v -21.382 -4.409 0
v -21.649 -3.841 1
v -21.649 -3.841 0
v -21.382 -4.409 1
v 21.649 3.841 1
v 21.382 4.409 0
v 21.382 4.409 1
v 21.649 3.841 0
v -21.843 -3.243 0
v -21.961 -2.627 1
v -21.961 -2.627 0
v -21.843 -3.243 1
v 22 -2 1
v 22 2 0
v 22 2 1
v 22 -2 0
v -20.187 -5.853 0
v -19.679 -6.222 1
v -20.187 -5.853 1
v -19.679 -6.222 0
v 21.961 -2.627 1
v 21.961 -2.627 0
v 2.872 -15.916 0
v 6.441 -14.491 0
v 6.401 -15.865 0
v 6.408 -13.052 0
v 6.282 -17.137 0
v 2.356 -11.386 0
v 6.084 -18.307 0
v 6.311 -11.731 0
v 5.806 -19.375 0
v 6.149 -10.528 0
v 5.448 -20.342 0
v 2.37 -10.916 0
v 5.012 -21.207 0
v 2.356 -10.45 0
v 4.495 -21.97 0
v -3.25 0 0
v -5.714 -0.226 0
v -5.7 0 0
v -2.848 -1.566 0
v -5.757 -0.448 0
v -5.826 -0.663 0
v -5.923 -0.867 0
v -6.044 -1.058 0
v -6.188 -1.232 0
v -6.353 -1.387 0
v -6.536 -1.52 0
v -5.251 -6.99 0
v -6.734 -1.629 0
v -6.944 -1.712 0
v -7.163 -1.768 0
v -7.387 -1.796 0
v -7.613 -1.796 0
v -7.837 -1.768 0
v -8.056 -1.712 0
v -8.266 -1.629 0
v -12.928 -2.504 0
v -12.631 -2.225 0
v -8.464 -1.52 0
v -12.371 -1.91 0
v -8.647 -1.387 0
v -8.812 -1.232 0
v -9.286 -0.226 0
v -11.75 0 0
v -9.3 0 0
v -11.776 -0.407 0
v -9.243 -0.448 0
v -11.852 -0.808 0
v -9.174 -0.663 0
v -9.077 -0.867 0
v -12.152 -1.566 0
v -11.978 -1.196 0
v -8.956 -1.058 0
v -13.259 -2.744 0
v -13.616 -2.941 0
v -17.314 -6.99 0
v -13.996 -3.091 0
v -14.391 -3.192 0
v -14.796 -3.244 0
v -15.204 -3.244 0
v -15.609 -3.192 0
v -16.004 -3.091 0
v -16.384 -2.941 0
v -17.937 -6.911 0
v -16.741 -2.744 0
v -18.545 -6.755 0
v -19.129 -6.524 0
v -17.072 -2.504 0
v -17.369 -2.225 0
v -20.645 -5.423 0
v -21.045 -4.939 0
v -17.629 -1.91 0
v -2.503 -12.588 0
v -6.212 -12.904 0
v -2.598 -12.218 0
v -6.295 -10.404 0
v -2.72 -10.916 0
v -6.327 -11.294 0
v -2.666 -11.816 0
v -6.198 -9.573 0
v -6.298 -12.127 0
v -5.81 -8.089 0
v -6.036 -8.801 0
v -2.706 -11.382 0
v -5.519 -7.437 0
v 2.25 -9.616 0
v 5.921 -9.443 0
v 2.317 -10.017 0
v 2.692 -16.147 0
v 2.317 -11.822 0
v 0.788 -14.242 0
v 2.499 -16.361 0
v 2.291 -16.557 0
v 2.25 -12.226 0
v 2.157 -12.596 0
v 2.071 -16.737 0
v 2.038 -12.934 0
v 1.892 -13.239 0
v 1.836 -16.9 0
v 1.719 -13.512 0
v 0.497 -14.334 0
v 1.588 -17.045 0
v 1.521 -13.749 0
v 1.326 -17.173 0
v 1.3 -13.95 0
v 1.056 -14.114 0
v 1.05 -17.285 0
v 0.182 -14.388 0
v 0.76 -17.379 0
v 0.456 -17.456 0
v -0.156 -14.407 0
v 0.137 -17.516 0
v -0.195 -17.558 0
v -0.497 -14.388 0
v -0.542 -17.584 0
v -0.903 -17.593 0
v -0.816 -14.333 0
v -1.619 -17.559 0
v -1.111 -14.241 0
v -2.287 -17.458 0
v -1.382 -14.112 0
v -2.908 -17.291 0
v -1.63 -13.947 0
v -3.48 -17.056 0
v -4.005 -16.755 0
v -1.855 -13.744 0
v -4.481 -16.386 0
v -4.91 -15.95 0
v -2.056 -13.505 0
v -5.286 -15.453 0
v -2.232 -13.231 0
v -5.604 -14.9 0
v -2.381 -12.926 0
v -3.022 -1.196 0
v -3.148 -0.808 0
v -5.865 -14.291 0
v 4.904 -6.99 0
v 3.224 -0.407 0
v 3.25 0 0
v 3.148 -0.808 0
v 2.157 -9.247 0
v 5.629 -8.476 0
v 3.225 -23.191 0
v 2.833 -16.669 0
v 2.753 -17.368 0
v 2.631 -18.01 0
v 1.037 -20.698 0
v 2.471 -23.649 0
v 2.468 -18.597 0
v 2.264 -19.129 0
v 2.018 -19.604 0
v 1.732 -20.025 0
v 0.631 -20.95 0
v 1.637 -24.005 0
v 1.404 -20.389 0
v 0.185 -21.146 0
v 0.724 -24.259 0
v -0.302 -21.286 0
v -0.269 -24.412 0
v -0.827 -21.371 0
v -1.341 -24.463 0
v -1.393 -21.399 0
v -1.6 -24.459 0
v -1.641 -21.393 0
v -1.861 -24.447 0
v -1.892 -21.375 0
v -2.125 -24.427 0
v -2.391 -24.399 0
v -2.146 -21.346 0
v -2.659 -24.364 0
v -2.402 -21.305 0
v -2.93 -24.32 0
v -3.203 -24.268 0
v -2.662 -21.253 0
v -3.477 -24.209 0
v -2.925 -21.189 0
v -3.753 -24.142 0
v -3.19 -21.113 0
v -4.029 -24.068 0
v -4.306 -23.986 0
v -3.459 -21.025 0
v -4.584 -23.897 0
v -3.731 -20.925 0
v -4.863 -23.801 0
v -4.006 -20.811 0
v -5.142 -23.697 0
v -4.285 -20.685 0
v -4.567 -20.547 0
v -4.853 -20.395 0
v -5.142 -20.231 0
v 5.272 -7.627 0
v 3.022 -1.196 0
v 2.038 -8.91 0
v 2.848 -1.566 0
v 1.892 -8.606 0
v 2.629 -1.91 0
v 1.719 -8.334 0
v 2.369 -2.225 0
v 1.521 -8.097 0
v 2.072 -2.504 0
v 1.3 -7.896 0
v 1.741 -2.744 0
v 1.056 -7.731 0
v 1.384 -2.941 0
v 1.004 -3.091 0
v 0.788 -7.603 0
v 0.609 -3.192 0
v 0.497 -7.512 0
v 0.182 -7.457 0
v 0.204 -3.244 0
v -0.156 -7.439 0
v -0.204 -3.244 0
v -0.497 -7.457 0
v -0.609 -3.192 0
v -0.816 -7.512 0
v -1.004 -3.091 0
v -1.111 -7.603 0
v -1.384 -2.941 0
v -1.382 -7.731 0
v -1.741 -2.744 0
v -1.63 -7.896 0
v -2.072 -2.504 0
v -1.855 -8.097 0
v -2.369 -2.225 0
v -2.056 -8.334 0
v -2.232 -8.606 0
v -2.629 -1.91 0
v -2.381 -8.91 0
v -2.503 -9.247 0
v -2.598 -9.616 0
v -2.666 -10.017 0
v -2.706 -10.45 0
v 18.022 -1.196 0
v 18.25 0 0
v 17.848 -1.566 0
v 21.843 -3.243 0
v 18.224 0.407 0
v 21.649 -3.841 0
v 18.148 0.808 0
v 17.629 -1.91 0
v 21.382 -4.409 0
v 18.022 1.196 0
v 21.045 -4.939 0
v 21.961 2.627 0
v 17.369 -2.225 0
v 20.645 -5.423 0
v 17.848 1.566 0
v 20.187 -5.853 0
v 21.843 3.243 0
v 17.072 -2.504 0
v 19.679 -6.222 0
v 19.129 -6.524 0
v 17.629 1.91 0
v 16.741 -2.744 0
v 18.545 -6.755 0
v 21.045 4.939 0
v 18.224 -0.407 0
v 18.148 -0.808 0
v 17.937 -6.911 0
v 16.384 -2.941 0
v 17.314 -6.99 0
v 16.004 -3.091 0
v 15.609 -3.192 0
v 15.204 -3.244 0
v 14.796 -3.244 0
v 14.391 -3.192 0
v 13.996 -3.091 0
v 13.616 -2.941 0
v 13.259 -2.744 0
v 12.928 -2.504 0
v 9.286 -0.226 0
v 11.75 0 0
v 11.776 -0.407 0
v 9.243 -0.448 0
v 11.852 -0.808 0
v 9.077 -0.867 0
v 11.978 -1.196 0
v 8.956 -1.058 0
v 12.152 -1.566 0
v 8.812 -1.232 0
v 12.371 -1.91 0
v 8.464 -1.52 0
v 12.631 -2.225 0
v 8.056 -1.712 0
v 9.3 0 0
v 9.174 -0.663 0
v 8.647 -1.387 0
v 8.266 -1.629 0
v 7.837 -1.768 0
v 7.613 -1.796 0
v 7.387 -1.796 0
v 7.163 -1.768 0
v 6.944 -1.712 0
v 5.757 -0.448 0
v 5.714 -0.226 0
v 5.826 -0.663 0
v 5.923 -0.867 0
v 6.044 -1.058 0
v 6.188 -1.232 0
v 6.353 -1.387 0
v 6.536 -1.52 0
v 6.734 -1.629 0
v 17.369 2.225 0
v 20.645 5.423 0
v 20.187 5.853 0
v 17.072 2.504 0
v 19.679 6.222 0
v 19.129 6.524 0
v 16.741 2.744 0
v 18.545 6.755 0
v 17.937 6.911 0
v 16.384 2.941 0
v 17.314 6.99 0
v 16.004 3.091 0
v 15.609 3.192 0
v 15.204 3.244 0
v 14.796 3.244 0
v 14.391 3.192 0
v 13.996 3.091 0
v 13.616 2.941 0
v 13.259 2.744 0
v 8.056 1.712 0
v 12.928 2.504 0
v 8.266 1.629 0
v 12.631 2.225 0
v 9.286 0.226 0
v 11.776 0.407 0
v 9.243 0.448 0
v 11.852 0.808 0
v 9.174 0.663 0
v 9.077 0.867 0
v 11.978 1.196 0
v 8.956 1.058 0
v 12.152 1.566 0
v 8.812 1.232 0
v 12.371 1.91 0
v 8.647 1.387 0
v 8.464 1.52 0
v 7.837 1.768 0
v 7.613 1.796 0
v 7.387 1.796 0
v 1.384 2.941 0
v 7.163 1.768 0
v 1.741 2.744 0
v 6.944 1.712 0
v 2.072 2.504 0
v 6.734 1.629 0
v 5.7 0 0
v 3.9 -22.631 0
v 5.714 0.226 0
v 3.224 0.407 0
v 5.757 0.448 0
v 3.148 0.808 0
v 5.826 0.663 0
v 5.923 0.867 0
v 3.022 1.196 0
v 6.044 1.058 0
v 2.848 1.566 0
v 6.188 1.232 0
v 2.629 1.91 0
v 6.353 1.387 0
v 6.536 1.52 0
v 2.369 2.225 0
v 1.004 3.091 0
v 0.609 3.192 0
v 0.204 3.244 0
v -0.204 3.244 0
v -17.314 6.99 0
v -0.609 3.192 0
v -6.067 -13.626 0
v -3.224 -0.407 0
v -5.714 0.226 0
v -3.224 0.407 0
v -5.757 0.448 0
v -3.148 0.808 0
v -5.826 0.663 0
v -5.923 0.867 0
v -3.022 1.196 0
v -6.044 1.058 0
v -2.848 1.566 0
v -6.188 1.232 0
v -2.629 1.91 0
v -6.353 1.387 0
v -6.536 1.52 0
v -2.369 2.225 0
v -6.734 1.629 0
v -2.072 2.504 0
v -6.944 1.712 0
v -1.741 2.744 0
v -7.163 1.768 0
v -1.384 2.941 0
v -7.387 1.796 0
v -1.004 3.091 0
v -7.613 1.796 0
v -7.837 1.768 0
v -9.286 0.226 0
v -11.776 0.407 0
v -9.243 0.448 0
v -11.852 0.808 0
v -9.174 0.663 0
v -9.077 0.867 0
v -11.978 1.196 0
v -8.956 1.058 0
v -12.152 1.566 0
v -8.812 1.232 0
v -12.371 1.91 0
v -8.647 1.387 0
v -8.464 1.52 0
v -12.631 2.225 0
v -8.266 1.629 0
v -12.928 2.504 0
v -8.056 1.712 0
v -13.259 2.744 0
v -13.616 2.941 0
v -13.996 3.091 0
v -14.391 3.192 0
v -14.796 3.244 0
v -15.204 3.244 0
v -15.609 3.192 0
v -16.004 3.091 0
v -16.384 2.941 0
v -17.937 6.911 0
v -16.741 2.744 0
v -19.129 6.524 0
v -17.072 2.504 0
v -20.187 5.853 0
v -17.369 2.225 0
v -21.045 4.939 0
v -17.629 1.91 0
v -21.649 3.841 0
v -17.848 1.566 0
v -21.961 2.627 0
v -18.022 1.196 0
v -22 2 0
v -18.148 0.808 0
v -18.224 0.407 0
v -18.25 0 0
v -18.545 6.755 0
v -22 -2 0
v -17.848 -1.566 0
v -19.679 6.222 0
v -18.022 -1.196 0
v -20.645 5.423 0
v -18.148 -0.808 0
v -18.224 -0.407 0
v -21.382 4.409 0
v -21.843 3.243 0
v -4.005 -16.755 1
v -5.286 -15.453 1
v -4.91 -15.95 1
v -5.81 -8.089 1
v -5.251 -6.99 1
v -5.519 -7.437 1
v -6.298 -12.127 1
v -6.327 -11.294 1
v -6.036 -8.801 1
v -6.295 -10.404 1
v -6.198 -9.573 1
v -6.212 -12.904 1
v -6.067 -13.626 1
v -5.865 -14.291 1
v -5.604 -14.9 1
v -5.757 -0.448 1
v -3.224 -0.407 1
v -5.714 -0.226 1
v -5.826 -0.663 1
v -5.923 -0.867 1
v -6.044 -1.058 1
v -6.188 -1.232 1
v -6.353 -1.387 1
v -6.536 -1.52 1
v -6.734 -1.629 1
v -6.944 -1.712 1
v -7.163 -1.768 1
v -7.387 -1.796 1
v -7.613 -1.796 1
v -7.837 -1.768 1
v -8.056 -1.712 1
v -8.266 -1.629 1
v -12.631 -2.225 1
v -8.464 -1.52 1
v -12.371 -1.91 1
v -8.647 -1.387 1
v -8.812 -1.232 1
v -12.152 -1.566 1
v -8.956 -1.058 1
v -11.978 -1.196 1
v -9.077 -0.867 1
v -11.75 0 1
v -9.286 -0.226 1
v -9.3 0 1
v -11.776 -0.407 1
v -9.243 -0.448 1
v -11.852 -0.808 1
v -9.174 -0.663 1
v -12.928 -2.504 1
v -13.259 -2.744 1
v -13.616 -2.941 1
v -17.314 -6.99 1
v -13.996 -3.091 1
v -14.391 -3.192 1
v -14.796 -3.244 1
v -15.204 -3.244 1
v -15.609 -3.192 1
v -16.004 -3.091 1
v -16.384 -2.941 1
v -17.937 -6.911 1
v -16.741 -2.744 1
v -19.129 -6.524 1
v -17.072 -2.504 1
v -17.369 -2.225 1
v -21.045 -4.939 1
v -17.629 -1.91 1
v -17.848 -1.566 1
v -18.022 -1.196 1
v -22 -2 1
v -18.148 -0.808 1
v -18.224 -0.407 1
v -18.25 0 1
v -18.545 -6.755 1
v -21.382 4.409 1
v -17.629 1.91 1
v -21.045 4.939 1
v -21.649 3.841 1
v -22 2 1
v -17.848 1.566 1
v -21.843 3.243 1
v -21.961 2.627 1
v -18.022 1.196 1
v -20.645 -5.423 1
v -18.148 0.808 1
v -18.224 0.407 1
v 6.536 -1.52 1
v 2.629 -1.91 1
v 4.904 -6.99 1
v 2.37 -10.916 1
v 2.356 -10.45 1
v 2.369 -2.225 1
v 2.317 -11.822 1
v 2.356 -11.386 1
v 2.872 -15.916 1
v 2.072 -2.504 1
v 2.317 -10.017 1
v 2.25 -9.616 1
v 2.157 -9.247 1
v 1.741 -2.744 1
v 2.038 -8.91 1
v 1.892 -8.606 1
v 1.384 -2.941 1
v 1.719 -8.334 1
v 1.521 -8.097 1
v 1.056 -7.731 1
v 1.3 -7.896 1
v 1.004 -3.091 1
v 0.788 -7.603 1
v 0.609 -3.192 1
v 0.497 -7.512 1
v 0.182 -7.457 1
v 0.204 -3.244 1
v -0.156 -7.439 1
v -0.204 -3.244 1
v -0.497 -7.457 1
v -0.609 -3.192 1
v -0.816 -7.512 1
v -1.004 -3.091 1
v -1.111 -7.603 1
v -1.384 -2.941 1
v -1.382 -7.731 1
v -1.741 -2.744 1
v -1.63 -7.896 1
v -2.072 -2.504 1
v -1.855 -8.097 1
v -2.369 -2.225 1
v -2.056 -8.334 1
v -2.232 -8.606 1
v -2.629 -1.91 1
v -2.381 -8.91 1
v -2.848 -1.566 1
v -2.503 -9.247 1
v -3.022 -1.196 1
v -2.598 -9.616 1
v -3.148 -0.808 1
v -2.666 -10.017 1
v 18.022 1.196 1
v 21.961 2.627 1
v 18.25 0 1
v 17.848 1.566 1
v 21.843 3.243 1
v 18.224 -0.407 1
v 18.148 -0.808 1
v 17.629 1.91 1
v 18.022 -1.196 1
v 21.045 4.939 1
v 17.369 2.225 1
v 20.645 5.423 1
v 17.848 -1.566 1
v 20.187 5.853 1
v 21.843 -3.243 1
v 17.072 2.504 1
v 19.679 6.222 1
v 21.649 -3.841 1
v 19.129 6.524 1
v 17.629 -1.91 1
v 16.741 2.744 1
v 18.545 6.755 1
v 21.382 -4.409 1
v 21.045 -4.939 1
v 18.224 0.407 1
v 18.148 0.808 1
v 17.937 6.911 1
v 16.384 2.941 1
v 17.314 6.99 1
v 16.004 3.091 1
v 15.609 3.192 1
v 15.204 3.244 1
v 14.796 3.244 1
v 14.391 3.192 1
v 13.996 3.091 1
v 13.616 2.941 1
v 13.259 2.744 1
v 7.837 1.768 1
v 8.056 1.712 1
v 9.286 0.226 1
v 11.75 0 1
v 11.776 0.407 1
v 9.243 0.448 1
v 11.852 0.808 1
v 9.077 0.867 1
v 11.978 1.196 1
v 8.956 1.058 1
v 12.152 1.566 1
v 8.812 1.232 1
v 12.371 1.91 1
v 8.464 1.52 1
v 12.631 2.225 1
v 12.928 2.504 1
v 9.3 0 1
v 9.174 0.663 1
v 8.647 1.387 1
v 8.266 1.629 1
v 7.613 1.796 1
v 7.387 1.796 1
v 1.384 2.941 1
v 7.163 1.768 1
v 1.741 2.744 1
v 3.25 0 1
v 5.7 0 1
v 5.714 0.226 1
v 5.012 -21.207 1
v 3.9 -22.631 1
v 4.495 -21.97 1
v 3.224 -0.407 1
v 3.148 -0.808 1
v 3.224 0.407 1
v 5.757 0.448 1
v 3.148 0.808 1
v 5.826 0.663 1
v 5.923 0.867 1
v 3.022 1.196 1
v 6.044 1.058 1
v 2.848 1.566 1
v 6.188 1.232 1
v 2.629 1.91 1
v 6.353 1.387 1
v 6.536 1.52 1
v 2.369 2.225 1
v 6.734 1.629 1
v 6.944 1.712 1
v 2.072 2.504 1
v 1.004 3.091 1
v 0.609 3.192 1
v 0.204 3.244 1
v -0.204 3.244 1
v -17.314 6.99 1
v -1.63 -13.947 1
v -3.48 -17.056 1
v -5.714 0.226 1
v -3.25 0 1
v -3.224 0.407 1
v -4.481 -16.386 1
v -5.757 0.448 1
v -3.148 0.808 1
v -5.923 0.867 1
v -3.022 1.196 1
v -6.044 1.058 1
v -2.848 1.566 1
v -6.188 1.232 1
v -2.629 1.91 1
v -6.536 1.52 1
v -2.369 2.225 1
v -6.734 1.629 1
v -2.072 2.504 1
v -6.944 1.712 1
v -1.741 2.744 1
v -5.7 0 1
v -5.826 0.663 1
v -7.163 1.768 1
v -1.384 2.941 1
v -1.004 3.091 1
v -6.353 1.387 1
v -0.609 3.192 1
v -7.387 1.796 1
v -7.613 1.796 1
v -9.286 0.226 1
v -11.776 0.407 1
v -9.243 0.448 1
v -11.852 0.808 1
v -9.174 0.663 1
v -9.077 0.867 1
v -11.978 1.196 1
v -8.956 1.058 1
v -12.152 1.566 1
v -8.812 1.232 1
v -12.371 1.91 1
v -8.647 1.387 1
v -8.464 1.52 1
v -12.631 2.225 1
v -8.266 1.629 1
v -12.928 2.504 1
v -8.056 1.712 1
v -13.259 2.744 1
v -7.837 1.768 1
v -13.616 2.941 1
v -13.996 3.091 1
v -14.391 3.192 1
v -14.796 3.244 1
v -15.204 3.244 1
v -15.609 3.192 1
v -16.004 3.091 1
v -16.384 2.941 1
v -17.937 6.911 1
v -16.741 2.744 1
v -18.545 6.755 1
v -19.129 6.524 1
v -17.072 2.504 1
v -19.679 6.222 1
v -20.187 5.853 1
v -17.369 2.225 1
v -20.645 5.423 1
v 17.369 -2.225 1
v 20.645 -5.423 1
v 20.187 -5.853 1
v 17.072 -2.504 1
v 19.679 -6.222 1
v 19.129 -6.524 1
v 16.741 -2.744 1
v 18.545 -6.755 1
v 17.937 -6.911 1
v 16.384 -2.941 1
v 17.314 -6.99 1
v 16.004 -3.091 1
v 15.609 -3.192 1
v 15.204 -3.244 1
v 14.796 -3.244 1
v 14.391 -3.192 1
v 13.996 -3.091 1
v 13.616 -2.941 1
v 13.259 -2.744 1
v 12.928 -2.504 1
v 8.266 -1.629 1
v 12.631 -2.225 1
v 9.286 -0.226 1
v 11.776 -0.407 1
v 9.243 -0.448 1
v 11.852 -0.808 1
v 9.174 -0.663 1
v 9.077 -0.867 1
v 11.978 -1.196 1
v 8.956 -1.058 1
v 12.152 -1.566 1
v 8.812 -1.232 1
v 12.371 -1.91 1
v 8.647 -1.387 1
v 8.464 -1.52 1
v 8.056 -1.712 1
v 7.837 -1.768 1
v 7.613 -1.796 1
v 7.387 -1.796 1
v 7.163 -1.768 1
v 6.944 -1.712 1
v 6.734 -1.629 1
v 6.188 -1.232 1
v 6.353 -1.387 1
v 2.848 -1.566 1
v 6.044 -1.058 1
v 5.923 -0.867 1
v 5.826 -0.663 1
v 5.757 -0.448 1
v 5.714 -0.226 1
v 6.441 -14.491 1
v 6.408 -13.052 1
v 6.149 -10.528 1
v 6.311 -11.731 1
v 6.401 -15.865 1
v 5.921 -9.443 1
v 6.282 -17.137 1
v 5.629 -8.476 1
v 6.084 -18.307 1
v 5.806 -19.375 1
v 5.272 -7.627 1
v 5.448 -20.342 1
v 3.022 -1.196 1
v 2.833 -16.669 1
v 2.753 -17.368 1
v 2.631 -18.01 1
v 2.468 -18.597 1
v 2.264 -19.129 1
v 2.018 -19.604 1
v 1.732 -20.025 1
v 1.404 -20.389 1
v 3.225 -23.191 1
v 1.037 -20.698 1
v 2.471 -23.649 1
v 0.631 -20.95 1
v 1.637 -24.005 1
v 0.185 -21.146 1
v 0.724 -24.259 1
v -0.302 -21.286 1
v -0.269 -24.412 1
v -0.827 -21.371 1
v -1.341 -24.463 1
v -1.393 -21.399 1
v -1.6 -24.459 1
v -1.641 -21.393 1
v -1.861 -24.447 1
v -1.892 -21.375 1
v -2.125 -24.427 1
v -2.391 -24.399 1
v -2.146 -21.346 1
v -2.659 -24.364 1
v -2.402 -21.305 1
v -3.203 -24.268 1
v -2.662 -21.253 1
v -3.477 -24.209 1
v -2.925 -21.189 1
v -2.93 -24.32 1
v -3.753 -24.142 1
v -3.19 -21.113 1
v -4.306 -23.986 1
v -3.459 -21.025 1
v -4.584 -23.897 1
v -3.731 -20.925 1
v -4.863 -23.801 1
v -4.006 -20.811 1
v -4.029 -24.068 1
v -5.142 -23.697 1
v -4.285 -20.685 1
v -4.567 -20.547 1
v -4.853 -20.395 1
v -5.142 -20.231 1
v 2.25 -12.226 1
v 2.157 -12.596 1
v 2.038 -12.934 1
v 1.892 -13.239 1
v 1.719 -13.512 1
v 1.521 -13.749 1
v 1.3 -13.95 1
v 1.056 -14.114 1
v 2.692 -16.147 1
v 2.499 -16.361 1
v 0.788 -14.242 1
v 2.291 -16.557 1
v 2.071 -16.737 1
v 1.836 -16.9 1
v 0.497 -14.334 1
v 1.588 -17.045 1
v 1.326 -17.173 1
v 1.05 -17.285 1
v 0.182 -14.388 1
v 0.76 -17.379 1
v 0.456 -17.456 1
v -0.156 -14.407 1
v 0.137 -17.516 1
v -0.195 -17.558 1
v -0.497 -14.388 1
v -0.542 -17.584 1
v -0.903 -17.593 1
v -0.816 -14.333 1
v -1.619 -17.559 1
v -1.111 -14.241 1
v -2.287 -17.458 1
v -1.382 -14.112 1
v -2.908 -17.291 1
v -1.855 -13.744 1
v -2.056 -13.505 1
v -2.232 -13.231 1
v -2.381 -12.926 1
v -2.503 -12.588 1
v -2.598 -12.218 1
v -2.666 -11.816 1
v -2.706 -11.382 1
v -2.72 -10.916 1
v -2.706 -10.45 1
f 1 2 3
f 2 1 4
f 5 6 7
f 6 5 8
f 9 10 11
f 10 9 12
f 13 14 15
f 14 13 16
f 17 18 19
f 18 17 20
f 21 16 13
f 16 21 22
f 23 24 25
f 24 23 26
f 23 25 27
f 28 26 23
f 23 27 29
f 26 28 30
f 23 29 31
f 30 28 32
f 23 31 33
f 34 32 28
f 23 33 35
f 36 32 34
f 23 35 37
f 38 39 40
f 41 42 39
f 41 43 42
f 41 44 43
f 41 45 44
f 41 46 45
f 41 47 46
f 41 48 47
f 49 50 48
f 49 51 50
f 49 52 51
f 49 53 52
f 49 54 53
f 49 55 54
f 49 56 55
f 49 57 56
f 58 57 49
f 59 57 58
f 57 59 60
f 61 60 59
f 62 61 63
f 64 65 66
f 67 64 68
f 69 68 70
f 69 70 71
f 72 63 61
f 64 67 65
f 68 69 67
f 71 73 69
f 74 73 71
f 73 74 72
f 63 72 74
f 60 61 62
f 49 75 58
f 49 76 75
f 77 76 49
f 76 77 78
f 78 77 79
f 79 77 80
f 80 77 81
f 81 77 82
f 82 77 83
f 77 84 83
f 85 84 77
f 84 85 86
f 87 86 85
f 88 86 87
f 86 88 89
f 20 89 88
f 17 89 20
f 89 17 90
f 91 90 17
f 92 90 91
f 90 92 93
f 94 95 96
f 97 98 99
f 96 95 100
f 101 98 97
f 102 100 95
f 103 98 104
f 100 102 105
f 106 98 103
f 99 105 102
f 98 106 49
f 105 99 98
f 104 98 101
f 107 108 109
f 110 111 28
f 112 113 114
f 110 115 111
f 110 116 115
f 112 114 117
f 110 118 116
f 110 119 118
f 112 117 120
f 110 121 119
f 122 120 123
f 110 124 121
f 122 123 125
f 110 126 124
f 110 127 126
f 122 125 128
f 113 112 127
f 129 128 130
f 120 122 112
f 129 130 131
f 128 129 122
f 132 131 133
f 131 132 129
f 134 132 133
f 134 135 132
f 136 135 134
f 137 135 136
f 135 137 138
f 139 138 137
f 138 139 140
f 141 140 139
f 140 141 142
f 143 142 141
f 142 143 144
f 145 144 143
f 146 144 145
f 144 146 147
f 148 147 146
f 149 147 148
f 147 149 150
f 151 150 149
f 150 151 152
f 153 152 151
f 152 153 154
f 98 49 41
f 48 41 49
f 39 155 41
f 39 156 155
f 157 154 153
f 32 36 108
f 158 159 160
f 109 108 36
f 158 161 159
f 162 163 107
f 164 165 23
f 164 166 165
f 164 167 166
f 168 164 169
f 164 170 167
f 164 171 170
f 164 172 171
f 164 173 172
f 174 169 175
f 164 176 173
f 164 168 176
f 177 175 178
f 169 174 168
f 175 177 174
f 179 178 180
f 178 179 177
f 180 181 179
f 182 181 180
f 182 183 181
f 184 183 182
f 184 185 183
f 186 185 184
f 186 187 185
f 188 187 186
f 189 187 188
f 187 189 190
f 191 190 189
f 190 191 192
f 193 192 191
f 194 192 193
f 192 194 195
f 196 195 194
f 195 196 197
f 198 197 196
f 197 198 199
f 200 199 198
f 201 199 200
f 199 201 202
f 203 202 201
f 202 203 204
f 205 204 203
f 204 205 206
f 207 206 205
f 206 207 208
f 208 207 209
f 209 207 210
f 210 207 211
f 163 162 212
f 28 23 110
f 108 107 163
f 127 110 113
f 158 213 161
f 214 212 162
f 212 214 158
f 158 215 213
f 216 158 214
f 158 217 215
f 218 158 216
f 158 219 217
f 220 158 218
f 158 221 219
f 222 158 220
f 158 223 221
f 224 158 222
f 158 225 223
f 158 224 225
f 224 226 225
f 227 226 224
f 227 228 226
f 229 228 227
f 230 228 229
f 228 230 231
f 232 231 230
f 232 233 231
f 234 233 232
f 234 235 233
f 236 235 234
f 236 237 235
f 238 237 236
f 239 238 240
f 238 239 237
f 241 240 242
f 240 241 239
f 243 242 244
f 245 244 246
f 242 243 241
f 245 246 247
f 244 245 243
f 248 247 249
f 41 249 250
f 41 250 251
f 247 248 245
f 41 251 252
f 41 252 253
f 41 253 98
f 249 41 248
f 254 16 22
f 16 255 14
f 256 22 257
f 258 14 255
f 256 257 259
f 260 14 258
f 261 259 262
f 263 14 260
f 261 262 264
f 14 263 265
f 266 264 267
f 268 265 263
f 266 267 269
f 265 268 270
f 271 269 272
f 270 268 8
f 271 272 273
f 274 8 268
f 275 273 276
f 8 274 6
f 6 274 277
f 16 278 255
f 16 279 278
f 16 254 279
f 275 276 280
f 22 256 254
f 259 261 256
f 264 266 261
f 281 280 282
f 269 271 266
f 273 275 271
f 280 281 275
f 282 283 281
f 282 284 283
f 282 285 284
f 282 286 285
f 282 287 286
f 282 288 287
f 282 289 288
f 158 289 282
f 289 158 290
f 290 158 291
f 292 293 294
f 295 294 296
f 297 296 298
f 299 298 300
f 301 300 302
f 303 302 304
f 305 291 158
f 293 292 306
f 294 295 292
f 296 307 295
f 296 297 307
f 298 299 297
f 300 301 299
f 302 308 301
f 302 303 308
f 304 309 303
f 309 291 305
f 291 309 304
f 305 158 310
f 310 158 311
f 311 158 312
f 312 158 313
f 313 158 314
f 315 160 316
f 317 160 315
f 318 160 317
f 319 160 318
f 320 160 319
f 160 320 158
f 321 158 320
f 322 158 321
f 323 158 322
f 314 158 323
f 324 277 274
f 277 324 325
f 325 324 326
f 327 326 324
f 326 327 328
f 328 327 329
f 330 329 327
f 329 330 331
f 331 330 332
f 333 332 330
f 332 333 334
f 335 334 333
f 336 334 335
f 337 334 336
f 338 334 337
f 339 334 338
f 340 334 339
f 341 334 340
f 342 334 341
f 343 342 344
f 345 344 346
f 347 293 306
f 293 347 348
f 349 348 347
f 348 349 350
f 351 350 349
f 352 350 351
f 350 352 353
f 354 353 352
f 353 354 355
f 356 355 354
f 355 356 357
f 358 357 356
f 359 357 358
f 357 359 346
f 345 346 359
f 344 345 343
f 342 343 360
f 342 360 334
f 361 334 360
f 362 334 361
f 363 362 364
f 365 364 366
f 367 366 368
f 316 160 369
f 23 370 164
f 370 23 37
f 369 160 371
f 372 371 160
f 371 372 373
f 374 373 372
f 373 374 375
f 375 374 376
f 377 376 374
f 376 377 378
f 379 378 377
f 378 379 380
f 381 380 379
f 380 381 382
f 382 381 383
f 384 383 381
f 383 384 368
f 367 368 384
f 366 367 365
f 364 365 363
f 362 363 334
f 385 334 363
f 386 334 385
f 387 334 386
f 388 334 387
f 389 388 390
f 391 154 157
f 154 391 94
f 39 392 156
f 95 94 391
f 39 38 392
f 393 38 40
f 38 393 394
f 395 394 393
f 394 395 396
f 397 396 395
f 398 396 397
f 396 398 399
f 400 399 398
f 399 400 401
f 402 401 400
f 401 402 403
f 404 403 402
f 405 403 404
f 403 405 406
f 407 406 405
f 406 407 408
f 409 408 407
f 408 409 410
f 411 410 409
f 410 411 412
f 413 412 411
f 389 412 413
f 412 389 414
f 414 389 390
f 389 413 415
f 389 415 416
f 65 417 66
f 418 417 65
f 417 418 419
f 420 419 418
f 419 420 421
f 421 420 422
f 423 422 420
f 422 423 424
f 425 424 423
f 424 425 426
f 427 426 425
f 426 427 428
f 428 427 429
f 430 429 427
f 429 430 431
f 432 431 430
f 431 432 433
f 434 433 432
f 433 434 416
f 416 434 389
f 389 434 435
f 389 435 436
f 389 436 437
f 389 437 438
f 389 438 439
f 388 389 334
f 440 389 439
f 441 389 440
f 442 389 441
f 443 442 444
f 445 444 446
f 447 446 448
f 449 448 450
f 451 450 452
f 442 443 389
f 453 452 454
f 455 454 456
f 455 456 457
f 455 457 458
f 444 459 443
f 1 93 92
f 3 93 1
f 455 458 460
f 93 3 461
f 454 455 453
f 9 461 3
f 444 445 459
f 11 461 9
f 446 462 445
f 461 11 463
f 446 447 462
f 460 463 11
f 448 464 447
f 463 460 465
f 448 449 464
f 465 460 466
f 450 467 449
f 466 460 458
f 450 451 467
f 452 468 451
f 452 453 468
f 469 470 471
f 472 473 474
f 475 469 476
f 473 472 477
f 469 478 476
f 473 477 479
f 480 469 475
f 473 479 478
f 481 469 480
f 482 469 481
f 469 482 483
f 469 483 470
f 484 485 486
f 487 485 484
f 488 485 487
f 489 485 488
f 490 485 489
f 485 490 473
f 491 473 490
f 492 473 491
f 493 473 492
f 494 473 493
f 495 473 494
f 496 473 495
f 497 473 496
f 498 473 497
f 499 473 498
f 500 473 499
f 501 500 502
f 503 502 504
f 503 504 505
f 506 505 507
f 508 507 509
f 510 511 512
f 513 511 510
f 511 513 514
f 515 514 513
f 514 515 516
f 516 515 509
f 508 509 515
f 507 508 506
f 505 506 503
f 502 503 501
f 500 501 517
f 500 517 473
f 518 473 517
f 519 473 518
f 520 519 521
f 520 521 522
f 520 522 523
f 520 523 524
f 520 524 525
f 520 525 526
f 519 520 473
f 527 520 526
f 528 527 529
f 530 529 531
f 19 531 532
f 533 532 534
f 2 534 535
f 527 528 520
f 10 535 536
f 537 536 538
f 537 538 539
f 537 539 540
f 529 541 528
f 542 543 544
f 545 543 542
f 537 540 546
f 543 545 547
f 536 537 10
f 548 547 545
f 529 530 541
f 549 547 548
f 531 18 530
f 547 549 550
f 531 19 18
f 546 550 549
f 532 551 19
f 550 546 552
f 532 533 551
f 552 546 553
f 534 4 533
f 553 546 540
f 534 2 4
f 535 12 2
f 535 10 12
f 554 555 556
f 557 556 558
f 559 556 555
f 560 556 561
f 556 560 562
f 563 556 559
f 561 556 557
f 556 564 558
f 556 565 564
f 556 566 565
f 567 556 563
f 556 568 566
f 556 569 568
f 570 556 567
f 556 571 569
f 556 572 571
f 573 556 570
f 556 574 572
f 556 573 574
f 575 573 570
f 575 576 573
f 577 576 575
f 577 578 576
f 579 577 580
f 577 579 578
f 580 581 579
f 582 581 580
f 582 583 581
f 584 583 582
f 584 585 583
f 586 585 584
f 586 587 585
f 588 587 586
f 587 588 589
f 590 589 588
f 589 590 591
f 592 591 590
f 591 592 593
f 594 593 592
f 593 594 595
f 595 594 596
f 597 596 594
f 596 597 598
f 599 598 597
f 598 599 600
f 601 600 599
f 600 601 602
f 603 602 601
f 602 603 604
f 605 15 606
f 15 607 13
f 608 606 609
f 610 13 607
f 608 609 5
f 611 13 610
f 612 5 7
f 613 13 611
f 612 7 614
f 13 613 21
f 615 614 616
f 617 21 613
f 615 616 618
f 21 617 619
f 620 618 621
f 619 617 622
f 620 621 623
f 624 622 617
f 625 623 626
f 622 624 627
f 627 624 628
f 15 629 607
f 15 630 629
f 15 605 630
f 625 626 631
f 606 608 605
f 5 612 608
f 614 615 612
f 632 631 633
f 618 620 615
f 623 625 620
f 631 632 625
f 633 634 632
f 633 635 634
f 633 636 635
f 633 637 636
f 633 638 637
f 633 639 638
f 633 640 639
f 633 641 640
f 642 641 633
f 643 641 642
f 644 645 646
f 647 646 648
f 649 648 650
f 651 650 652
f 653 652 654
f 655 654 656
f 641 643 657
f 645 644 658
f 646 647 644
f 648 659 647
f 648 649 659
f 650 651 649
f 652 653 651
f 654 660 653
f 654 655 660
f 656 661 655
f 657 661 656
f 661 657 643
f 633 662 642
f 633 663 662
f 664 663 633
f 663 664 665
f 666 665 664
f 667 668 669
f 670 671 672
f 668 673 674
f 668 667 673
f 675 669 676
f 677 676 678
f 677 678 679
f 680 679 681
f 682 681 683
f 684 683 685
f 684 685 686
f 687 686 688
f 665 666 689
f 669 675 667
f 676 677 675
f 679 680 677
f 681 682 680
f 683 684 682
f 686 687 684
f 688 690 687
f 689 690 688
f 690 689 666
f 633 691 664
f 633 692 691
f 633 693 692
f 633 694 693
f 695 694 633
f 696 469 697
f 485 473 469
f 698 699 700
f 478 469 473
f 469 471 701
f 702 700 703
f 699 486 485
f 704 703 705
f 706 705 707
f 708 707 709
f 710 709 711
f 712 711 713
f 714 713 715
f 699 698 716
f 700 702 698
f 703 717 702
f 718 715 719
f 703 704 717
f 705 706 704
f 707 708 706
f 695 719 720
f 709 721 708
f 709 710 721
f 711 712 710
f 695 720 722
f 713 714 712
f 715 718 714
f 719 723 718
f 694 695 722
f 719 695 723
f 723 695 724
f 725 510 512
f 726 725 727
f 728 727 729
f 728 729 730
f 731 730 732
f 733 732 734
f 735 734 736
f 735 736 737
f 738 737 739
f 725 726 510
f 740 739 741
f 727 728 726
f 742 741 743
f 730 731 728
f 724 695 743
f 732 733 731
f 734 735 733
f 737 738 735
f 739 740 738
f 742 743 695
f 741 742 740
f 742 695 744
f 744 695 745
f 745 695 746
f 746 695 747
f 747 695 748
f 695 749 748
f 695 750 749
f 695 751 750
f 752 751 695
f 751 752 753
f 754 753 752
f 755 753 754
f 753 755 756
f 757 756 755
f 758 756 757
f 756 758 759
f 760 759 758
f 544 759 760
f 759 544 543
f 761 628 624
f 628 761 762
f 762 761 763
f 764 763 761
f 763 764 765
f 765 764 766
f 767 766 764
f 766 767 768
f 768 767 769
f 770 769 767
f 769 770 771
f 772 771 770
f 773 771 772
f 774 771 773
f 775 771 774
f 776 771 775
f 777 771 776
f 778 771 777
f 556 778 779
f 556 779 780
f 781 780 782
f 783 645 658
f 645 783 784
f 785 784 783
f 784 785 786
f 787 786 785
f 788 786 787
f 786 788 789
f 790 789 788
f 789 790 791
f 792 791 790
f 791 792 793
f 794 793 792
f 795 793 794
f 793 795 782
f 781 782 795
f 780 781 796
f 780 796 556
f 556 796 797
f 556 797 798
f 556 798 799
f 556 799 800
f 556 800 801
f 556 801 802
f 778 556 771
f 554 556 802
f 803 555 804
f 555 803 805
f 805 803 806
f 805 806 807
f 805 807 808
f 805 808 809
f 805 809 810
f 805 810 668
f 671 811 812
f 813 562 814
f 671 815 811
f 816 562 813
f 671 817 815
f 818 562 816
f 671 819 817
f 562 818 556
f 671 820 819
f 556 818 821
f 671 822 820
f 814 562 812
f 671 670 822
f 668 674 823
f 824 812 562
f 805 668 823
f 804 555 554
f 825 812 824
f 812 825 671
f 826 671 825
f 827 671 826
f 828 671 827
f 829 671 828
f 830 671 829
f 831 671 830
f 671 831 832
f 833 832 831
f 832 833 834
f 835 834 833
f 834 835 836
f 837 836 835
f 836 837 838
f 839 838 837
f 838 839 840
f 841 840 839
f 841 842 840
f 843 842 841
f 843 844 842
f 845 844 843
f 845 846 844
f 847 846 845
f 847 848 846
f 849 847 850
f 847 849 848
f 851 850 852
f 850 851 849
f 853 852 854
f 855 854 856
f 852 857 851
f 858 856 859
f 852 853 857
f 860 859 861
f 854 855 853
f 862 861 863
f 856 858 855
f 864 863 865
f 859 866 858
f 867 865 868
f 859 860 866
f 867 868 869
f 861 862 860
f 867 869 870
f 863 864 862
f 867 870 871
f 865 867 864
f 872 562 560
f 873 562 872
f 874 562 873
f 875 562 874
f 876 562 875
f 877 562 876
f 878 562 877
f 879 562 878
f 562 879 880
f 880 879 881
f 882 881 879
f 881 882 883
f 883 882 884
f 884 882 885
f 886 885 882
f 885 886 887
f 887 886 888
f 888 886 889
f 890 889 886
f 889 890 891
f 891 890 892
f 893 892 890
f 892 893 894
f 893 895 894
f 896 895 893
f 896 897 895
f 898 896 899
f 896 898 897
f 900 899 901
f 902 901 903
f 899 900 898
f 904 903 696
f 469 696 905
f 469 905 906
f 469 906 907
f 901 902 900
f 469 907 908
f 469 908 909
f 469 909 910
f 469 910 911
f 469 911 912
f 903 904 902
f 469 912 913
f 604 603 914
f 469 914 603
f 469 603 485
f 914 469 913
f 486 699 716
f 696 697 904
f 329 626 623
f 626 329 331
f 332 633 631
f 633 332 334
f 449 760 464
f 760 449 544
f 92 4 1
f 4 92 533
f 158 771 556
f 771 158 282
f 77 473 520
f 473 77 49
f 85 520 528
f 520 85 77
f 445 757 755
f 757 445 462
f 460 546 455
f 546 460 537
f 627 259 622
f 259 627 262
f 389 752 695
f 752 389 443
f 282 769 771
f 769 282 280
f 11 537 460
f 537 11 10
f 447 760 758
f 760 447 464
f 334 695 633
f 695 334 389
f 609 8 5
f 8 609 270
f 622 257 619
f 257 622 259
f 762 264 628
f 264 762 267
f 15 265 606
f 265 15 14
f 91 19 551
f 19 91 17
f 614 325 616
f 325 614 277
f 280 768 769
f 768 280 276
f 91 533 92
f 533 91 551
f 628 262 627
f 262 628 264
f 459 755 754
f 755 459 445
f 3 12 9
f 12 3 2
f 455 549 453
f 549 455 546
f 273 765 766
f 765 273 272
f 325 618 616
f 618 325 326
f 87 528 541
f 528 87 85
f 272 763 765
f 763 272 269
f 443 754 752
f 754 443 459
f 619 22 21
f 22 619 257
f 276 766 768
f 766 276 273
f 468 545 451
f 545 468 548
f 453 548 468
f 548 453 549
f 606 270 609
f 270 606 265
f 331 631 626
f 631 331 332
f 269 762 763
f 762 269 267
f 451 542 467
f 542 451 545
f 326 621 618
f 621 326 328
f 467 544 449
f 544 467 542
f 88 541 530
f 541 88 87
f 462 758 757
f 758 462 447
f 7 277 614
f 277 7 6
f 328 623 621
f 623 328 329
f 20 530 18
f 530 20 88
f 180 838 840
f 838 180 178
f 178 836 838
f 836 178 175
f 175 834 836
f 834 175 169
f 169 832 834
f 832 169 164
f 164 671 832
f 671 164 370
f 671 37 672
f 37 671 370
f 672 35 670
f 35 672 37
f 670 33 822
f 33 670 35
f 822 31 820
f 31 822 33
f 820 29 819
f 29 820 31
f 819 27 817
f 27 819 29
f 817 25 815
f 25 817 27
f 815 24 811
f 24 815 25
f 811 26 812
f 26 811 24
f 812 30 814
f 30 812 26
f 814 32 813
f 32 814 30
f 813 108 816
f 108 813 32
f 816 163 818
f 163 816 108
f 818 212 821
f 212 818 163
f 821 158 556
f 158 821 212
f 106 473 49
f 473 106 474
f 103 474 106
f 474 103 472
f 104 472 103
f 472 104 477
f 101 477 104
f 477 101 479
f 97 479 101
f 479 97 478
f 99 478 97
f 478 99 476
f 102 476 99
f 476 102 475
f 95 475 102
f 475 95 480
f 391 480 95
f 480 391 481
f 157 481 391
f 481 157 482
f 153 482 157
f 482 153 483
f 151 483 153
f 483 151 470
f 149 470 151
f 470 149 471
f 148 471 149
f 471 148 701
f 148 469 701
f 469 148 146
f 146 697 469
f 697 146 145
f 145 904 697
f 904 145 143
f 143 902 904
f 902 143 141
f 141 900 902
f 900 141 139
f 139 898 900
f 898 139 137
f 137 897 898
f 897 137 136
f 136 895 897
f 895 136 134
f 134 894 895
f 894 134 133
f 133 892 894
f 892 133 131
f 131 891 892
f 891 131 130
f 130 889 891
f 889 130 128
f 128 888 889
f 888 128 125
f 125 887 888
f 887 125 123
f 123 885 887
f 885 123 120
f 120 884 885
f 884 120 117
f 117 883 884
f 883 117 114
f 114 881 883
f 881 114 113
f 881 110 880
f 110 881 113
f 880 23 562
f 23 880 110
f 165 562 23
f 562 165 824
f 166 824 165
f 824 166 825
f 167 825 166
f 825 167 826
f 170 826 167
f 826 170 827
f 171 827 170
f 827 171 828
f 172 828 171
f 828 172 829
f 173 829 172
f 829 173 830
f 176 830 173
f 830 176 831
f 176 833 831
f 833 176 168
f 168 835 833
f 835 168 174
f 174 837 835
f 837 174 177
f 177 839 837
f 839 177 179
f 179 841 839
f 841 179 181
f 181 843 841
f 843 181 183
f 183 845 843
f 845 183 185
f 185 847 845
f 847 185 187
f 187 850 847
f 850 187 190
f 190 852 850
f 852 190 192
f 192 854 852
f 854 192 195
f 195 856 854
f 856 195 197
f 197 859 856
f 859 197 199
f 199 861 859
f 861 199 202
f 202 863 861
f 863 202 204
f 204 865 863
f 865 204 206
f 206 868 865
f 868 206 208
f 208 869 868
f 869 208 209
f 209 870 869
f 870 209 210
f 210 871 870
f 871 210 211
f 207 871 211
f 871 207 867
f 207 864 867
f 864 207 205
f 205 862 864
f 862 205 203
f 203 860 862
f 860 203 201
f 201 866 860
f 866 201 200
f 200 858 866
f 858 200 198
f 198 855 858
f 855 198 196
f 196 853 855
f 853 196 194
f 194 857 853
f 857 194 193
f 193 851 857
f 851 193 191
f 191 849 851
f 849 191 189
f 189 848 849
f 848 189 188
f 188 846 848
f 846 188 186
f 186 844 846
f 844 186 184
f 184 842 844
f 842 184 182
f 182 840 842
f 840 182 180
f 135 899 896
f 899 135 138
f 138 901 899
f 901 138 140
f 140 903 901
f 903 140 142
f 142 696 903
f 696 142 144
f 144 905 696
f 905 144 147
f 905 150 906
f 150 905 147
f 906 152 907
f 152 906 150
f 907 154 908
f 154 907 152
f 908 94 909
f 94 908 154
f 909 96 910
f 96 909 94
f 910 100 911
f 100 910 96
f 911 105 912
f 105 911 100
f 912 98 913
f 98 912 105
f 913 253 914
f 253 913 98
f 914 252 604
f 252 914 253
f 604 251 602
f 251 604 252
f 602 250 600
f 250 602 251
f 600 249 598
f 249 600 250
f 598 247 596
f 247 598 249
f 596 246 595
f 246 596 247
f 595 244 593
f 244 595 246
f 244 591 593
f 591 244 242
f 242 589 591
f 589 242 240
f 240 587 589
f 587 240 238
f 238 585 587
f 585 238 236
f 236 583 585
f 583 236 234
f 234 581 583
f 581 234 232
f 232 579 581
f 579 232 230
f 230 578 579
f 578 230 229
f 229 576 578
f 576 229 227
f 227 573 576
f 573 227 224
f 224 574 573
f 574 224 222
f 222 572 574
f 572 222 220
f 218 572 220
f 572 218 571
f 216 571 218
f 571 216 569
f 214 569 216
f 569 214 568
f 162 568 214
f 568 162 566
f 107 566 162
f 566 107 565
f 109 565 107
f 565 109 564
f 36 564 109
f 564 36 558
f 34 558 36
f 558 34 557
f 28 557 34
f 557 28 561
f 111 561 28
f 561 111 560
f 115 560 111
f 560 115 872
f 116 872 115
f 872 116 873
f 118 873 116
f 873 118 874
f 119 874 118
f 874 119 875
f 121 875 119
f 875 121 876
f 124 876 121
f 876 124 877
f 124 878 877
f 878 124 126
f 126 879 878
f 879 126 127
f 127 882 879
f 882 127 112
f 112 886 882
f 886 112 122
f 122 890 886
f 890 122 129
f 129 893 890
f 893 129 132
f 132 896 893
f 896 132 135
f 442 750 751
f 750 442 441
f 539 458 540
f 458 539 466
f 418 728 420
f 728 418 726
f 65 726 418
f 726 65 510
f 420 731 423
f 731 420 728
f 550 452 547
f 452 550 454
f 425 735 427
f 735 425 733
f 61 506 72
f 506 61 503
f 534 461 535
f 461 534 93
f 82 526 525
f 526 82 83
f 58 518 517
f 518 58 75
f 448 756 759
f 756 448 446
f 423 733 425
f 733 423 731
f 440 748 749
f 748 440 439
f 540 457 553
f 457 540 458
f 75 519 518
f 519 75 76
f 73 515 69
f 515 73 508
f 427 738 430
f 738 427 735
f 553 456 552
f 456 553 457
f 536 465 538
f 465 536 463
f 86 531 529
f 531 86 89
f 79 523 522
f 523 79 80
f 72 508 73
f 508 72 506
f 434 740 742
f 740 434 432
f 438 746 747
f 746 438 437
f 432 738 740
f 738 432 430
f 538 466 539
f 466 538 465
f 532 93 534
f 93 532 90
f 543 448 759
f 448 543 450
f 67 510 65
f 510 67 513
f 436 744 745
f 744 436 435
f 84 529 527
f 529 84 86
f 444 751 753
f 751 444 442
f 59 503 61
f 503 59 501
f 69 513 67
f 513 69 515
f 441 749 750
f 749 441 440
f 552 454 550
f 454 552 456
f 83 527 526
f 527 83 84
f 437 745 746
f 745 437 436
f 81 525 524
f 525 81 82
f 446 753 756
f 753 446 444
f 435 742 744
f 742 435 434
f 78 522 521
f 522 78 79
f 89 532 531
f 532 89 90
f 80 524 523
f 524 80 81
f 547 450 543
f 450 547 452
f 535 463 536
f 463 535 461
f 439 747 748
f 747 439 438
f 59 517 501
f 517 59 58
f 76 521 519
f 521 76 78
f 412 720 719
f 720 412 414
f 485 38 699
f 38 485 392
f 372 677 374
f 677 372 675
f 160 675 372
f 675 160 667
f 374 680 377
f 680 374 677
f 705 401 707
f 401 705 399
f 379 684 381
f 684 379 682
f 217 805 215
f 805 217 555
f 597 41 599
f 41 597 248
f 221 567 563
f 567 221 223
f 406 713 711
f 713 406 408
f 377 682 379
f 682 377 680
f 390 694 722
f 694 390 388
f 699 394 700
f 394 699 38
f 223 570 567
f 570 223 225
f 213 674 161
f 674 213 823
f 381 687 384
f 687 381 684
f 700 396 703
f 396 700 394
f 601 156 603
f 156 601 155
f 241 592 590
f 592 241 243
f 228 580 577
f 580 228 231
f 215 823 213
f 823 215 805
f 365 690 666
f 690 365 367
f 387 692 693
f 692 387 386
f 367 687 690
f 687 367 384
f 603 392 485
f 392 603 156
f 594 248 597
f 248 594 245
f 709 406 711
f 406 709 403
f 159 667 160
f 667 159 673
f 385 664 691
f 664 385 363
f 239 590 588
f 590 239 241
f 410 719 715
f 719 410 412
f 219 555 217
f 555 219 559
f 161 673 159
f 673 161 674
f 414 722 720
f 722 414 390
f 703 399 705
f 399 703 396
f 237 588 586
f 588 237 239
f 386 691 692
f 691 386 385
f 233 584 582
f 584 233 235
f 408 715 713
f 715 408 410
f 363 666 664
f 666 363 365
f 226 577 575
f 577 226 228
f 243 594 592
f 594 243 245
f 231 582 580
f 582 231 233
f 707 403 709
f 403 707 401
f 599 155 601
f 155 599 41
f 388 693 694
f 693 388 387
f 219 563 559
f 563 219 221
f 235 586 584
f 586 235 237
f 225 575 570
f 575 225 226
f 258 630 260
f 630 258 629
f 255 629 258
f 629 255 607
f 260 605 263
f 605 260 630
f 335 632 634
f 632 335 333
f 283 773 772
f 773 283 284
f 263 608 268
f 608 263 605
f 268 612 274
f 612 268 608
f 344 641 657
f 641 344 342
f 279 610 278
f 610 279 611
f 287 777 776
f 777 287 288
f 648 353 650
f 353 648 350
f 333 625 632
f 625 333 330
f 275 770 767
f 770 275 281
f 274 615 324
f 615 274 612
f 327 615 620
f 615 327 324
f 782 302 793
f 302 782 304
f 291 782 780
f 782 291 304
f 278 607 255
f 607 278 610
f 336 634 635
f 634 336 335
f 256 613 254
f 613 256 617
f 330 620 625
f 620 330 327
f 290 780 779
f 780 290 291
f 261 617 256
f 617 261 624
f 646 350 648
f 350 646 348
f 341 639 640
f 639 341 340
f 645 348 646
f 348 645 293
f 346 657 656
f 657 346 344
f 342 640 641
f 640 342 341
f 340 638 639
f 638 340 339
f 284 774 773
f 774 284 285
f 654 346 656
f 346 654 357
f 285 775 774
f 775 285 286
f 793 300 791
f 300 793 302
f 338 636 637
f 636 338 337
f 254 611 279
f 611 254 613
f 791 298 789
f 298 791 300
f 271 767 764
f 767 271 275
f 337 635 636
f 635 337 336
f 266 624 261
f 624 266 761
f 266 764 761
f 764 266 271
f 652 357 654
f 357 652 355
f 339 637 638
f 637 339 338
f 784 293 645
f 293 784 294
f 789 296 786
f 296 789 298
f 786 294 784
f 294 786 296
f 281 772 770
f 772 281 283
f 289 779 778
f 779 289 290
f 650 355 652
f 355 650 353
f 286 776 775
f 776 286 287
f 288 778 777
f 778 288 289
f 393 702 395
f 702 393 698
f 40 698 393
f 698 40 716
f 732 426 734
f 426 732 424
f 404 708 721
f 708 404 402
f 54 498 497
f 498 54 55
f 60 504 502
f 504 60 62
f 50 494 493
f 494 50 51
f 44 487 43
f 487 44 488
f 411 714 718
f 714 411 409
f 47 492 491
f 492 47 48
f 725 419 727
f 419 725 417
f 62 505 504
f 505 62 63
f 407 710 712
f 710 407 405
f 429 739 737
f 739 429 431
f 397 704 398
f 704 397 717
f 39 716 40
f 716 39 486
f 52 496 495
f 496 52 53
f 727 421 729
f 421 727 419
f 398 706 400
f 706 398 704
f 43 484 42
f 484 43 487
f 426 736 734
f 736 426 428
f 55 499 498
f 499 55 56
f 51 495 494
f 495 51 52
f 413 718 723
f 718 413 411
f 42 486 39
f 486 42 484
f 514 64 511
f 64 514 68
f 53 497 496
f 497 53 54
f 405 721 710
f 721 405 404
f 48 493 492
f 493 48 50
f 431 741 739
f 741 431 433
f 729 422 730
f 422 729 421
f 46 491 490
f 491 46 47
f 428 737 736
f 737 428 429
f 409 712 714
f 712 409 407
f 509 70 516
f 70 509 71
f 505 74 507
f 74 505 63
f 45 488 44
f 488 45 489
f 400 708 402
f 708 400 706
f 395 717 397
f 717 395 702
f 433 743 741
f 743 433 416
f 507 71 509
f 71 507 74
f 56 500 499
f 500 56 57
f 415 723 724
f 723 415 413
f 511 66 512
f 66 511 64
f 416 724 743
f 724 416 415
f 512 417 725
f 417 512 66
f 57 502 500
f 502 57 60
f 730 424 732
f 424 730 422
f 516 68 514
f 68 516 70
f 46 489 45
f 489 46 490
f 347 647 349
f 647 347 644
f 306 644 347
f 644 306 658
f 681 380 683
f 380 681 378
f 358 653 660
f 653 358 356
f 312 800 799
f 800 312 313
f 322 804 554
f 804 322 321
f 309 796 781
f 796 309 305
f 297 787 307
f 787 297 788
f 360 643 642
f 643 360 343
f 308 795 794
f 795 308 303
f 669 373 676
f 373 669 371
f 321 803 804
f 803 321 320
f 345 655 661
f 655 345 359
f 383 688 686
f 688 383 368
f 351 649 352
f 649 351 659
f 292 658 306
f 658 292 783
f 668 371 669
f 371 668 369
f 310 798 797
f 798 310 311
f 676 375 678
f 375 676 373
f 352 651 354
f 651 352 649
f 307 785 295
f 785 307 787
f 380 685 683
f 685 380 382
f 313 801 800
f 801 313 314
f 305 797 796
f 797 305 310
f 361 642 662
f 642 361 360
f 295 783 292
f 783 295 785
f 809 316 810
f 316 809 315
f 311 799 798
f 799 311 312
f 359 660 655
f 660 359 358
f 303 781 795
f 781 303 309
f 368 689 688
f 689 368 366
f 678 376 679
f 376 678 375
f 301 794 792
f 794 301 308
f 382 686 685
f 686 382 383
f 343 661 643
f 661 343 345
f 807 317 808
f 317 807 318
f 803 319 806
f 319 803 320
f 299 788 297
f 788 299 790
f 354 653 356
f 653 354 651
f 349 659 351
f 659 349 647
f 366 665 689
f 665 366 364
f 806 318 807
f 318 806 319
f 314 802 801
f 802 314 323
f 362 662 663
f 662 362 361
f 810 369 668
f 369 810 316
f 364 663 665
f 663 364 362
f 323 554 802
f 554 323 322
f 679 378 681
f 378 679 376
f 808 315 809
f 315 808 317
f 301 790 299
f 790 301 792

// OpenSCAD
$fn = 50;


difference() {
	union() {
		hull() {
			translate(v = [-17.0000000000, 2.0000000000, 0]) {
				cylinder(h = 1, r = 5);
			}
			translate(v = [17.0000000000, 2.0000000000, 0]) {
				cylinder(h = 1, r = 5);
			}
			translate(v = [-17.0000000000, -2.0000000000, 0]) {
				cylinder(h = 1, r = 5);
			}
			translate(v = [17.0000000000, -2.0000000000, 0]) {
				cylinder(h = 1, r = 5);
			}
		}
		translate(v = [0, -5, 0]) {
			linear_extrude(height = 1) {
				text(font = "DejaVu Sans Mono:style=Bold", halign = "center", size = 19.0000000000, text = "9", valign = "top");
			}
		}
	}
	union() {
		translate(v = [-15.0000000000, 0.0000000000, 0]) {
			translate(v = [0, 0, -100]) {
				cylinder(h = 200, r = 3.2500000000);
			}
		}
		translate(v = [0, 0, -100]) {
			cylinder(h = 200, r = 3.2500000000);
		}
		translate(v = [15.0000000000, 0.0000000000, 0]) {
			translate(v = [0, 0, -100]) {
				cylinder(h = 200, r = 3.2500000000);
			}
		}
		translate(v = [-15.0000000000, 0.0000000000, 0]) {
			translate(v = [0, 0, -100]) {
				cylinder(h = 200, r = 1.8000000000);
			}
		}
		translate(v = [-7.5000000000, 0.0000000000, 0]) {
			translate(v = [0, 0, -100]) {
				cylinder(h = 200, r = 1.8000000000);
			}
		}
		translate(v = [0, 0, -100]) {
			cylinder(h = 200, r = 1.8000000000);
		}
		translate(v = [7.5000000000, 0.0000000000, 0]) {
			translate(v = [0, 0, -100]) {
				cylinder(h = 200, r = 1.8000000000);
			}
		}
		translate(v = [15.0000000000, 0.0000000000, 0]) {
			translate(v = [0, 0, -100]) {
				cylinder(h = 200, r = 1.8000000000);
			}
		}
	}
}
